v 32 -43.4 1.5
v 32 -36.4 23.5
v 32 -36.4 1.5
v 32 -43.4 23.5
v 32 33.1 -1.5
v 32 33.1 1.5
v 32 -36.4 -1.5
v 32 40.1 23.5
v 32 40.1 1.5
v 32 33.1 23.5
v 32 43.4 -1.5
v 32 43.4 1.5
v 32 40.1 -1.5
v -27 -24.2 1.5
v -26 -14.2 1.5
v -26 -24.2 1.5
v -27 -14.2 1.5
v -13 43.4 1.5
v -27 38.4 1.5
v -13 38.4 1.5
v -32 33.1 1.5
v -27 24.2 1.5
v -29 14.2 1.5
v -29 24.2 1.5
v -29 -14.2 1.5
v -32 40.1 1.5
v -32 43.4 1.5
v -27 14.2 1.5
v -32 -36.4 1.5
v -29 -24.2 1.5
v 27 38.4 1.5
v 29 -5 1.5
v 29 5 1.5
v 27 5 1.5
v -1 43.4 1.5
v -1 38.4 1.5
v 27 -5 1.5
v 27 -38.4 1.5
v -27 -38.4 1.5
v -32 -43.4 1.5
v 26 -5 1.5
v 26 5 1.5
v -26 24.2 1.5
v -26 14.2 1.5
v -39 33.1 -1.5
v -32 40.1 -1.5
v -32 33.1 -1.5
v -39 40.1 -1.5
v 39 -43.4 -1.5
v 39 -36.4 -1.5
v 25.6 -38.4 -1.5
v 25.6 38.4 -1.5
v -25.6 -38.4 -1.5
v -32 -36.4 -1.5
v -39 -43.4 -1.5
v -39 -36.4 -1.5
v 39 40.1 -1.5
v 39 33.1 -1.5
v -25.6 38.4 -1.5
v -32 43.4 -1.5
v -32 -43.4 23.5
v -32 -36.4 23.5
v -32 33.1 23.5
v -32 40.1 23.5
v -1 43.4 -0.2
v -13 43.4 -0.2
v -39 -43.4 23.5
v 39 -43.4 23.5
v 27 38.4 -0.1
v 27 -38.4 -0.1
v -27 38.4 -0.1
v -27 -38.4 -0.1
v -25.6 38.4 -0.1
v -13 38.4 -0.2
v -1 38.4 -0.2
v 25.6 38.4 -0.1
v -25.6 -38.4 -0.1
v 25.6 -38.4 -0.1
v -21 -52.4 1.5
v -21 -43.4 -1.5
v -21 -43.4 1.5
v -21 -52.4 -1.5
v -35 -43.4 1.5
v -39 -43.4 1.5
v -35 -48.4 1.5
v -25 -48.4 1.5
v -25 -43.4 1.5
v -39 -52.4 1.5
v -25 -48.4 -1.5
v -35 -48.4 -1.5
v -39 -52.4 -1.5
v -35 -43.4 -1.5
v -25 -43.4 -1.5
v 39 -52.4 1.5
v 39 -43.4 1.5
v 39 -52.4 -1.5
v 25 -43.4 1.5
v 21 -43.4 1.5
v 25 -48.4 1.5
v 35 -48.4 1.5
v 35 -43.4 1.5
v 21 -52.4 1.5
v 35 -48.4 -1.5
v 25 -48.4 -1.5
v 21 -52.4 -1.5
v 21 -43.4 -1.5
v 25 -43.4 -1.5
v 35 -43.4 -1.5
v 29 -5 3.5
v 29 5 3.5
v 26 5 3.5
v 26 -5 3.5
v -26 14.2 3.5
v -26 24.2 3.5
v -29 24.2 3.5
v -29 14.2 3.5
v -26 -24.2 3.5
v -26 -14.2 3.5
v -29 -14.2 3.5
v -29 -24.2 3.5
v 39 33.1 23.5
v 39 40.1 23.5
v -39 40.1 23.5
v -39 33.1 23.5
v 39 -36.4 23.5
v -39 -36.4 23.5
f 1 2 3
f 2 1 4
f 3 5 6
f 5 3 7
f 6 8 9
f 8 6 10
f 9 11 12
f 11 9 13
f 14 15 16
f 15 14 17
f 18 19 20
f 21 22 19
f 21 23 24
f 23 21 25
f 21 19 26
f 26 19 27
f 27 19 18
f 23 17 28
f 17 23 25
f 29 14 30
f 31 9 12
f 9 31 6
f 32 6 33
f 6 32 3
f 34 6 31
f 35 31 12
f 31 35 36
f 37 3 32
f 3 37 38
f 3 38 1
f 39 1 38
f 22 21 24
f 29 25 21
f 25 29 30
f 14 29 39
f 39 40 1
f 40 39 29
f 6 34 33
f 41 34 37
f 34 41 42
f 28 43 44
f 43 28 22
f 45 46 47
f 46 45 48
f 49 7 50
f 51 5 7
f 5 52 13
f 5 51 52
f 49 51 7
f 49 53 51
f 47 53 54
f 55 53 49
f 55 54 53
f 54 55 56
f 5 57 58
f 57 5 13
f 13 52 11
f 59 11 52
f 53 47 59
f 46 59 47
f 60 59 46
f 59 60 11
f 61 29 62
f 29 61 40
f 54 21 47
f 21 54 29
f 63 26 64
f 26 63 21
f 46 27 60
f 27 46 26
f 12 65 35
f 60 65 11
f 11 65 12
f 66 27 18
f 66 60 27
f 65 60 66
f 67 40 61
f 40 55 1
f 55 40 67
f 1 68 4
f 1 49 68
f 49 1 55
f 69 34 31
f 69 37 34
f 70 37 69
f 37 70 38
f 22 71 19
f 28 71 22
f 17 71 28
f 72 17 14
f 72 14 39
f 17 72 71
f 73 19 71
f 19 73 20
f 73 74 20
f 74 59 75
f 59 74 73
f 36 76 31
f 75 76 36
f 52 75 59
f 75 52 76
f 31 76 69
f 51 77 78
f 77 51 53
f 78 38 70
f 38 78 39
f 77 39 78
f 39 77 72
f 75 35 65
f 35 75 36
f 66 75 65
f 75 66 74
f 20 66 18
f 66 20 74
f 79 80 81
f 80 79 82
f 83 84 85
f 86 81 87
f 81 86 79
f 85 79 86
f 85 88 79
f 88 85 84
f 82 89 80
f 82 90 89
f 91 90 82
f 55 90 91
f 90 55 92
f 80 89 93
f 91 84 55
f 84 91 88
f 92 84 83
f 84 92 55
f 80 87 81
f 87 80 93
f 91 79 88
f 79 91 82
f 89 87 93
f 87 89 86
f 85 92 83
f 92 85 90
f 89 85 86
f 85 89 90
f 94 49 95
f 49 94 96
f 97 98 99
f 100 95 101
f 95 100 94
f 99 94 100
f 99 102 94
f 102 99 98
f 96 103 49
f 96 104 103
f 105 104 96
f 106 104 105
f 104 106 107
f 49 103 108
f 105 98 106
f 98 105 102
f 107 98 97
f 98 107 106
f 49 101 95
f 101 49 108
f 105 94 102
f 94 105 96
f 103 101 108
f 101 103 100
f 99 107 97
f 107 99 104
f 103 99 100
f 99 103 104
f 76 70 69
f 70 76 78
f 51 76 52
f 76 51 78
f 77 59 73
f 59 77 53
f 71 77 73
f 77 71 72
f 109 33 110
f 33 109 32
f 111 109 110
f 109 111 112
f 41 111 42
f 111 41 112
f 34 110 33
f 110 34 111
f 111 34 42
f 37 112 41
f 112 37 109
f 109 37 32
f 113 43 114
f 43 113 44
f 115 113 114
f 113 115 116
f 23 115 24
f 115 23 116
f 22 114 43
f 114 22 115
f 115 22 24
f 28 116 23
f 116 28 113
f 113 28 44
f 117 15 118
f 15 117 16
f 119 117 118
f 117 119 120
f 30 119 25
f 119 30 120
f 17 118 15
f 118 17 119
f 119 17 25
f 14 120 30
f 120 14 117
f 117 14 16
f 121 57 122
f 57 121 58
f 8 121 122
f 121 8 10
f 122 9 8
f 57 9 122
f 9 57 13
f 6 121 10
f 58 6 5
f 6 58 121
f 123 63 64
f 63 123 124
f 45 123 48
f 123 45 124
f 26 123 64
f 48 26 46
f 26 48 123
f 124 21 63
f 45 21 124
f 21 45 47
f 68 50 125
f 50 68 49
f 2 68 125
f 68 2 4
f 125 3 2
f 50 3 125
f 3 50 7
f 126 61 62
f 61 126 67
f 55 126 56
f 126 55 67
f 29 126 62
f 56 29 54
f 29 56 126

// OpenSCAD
pcbWidth = 54;
pcbHeight = 76.8;
border = 5;
thickness = 3;
inset = 1.4;
pcbDepth = 1.6;
powerCordGapDepth = 1.7;
retainerWidth = 3;
retainerDepth = 2;

spacerWidth = 7;
spacerDepth = 7;
spacerHeight = 25;


difference() {
	difference() {
    		cube([pcbWidth + (border * 2), pcbHeight + (border * 2), thickness], center = true);
	    cube([pcbWidth, pcbHeight, thickness], center = true);
	};
	translate([ - pcbWidth / 2 + 20, (border + pcbHeight) / 2, (thickness / 2) - (powerCordGapDepth / 2)]) cube([12, border, powerCordGapDepth], center=true);
};

translate([(pcbWidth / 2) - (inset / 2), 0, - (thickness / 2) + (inset / 2)]) cube([inset, pcbHeight, inset], center=true);
translate([- (pcbWidth / 2) + (inset / 2), 0, - (thickness / 2) + (inset / 2)]) cube([inset, pcbHeight, inset], center=true);

translate([0.5 + pcbWidth / 2, 0, (thickness / 2) + (retainerDepth / 2)]) cube([retainerWidth, 10, retainerDepth], center=true);
translate([-0.5 - pcbWidth / 2, pcbHeight / 4, (thickness / 2) + (retainerDepth / 2)]) cube([retainerWidth, 10, retainerDepth], center=true);
translate([-0.5 - pcbWidth / 2, -pcbHeight / 4, (thickness / 2) + (retainerDepth / 2)]) cube([retainerWidth, 10, retainerDepth], center=true);

translate([(pcbWidth / 2) + border + (spacerWidth / 2), (pcbHeight / 2) - (spacerDepth / 2) + border - 3.3, (spacerHeight / 2) - thickness / 2]) 
	cube([spacerWidth, spacerDepth, spacerHeight], center=true);

translate([- (pcbWidth / 2) - border - (spacerWidth / 2), (pcbHeight / 2) - (spacerDepth / 2) + border - 3.3, (spacerHeight / 2) - thickness / 2]) 
	cube([spacerWidth, spacerDepth, spacerHeight], center=true);

translate([(pcbWidth / 2) + border + (spacerWidth / 2), - (pcbHeight / 2) + (spacerDepth / 2) - border, (spacerHeight / 2) - thickness / 2]) 
	cube([spacerWidth, spacerDepth, spacerHeight], center=true);

translate([- (pcbWidth / 2) - border - (spacerWidth / 2), - (pcbHeight / 2) + (spacerDepth / 2) - border, (spacerHeight / 2) - thickness / 2]) 
	cube([spacerWidth, spacerDepth, spacerHeight], center=true);

	translate([-30, - (pcbHeight / 2) - border - 4.5, 0])
		difference() {
			cube([18, 9, thickness], center=true);
			translate([0, 2, 0]) cube([10, 5, thickness], center=true);
		};

	translate([30, - (pcbHeight / 2) - border - 4.5, 0])
		difference() {
			cube([18, 9, thickness], center=true);
			translate([0, 2, 0]) cube([10, 5, thickness], center=true);
		};
